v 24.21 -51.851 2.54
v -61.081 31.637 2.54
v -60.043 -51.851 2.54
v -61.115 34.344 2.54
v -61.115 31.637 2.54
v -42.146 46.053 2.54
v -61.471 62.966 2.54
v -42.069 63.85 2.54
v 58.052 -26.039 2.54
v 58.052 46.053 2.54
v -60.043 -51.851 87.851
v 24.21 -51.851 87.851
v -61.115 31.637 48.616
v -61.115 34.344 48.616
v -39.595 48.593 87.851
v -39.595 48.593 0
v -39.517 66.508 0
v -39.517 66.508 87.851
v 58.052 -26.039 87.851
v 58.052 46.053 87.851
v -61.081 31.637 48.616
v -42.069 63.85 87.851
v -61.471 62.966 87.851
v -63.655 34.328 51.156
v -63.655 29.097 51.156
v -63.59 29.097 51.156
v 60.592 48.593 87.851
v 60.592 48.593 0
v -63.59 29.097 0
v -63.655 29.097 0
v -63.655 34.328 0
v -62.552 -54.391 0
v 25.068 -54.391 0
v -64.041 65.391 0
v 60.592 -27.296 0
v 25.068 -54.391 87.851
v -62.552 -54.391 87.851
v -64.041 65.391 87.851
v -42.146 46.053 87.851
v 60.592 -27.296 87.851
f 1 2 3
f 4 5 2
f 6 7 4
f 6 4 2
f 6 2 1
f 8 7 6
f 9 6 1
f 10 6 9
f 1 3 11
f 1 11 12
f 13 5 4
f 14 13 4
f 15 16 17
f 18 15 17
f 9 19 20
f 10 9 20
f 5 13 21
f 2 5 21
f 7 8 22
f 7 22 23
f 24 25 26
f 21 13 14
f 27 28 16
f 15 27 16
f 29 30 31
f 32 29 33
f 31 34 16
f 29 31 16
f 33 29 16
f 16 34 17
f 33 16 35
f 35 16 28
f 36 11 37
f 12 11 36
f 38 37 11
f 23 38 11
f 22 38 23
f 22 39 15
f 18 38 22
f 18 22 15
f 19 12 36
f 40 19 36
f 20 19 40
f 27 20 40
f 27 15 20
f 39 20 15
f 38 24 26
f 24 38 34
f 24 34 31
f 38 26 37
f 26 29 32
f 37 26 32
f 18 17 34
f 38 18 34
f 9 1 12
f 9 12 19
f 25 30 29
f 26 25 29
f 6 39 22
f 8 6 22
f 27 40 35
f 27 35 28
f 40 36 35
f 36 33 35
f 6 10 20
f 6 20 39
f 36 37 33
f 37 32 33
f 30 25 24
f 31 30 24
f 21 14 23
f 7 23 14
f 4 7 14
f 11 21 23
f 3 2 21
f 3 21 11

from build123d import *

# Parameters (mm, degrees)
F1_DEPTH = 62.4507963657
F2_W     = 60.3333711624
F2_H     = 19.3066857755
F4_DEPTH = 51.1555597186
F5_DEPTH = 25.4
F6_T     = -2.54


with BuildPart() as f1:
    # F0 (on Top) → F1 (new body)
    with BuildSketch(Plane.XY):
        Polygon((-39.5169705153, 66.5083825588), (-64.0413761139, 65.3912201524), (-62.551535666, -54.3909370899), (25.0678188681, -54.3909370899), (60.5918616056, -27.2963196039), (60.5918616056, 48.5934764147), (-39.5946651697, 48.5934764147), align=None)
    extrude(amount=F1_DEPTH)

    # F2 (on Top) → F4 (join)
    with BuildSketch(Plane.XY):
        with Locations((-33.4883257747, 38.7507472187)):
            Rectangle(F2_W, F2_H)
    extrude(amount=F4_DEPTH)

    # F5 (add): a face of the model
    f5_faces = [f1.faces().sort_by_distance(p)[0] for p in [
        (-4.8768218944, 0.8081448517, 62.4507963657),
    ]]
    extrude(f5_faces, amount=F5_DEPTH)

    # F6
    f6_openings = [f1.faces().sort_by_distance(p)[0] for p in [
        (-4.876822, 0.808145, 87.850796),
    ]]
    offset(amount=F6_T, openings=f6_openings, kind=Kind.INTERSECTION)


solid = f1.part
